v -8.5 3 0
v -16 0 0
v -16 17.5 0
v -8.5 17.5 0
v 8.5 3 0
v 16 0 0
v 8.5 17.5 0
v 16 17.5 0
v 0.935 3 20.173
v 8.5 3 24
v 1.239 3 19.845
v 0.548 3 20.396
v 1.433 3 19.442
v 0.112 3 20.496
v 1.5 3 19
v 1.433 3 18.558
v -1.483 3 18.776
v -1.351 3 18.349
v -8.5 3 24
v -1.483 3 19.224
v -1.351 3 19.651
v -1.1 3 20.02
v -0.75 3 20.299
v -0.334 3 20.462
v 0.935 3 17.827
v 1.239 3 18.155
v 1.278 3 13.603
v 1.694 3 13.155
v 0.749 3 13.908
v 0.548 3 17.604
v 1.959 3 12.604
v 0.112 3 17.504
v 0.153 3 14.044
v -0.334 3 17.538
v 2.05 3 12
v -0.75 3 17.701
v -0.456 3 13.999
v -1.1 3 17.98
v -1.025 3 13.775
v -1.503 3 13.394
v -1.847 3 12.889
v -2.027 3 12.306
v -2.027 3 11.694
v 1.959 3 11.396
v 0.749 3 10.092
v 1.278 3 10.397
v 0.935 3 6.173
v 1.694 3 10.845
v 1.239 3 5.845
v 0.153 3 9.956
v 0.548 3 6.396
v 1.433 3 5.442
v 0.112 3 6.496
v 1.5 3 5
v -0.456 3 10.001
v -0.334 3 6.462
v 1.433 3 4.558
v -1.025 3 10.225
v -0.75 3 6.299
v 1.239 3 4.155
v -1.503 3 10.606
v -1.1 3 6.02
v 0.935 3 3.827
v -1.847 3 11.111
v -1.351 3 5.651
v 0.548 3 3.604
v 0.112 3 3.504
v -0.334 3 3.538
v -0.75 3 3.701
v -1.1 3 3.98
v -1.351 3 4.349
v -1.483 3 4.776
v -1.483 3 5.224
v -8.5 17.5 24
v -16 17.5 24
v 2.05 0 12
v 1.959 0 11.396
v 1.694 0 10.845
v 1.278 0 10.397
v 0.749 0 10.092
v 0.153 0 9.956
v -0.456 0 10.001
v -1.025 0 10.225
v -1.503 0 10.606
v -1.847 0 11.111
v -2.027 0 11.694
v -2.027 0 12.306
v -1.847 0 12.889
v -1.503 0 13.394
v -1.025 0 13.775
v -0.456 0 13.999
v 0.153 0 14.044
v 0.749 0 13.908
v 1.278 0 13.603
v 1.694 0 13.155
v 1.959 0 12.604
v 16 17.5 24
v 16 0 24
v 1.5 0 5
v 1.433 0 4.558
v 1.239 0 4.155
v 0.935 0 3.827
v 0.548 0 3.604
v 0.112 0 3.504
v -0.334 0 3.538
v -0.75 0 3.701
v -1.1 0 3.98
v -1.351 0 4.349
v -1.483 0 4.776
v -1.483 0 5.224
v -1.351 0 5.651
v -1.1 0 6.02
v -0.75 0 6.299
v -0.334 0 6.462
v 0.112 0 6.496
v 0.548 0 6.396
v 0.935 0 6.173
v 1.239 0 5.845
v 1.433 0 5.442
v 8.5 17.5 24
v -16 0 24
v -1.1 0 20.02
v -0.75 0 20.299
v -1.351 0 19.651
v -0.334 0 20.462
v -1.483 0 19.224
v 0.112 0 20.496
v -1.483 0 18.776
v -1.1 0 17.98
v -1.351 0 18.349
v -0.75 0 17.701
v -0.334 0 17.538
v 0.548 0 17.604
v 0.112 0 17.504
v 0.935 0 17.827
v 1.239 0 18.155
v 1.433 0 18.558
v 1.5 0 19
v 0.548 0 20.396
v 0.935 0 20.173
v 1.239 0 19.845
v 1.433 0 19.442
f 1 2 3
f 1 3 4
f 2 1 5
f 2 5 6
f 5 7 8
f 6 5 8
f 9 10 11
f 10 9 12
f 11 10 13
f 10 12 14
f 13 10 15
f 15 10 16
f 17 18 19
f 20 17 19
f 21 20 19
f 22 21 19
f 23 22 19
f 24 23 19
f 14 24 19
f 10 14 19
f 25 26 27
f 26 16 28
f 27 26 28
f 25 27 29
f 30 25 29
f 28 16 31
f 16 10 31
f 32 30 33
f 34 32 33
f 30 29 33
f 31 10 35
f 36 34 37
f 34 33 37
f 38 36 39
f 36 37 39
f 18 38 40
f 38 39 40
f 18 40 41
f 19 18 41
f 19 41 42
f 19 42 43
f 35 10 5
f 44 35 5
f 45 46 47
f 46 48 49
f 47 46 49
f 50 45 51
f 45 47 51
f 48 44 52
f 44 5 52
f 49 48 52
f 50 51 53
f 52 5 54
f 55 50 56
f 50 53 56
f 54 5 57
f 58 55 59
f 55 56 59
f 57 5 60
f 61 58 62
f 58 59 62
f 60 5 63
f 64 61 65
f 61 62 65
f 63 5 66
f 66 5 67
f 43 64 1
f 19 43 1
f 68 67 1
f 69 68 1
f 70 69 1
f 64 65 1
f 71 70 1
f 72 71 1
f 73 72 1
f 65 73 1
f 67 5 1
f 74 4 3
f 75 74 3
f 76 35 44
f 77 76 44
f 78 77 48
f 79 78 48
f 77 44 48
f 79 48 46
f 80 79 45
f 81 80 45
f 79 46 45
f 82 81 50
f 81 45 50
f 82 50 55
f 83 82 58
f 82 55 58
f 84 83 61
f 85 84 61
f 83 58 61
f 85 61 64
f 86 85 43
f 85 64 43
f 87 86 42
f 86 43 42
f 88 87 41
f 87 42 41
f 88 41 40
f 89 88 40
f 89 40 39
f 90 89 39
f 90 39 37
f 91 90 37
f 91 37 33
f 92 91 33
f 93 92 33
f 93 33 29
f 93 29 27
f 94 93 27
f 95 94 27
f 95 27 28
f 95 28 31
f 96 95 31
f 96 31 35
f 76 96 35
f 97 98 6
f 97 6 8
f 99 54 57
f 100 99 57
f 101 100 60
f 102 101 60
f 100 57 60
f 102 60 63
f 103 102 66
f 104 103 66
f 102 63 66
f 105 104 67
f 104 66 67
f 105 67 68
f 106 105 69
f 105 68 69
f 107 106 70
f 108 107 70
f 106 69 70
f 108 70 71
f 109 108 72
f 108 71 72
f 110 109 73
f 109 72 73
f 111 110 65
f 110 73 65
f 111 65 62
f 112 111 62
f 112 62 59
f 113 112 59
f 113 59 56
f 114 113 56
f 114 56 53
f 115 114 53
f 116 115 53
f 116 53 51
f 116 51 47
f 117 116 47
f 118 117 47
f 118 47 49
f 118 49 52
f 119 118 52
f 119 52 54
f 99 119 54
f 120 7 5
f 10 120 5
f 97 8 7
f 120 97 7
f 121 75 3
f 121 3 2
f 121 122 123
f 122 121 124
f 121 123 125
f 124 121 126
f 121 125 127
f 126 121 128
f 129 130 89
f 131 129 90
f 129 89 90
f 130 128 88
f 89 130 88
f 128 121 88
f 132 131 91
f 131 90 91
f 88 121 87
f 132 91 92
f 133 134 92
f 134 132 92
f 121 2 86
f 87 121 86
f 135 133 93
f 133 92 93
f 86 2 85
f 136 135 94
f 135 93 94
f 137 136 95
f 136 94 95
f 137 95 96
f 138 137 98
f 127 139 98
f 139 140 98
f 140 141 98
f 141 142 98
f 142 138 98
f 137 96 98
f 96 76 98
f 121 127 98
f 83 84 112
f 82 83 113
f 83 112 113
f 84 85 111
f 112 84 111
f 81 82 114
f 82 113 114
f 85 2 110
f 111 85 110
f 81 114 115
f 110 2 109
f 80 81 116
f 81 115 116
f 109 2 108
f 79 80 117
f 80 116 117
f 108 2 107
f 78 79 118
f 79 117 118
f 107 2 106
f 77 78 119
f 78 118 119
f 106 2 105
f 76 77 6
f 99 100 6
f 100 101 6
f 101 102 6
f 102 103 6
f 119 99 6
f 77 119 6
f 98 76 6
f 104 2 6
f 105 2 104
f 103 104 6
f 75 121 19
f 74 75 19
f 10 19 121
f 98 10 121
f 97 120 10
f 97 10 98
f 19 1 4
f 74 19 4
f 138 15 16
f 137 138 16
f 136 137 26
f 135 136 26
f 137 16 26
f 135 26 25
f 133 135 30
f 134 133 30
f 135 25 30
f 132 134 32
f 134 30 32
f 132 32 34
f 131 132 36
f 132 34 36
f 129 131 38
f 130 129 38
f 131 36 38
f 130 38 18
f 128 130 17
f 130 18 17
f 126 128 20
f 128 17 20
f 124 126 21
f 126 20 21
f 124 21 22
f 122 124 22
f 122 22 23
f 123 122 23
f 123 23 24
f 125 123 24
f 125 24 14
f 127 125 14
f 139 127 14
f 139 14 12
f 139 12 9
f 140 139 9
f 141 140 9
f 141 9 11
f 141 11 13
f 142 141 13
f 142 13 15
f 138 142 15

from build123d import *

# Parameters (mm, degrees)
BOSS_EXTRUDE1_DEPTH = 24
CUT_EXTRUDE1_REACH  = 5
SKETCH4_R           = 1.5
SKETCH4_R_2         = 2.05


with BuildPart() as part:
    # Sketch3 → Boss-Extrude1 (new body)
    with BuildSketch(Plane.XY):
        Polygon((-16, 0), (16, 0), (16, 17.5), (8.5, 17.5), (8.5, 3), (-8.5, 3), (-8.5, 17.5), (-16, 17.5), align=None)
    extrude(amount=BOSS_EXTRUDE1_DEPTH)

    # Sketch4 → Cut-Extrude1 (cut, up to next)
    with BuildSketch(Plane(origin=(0, 3, 0), x_dir=(1, 0, 0), z_dir=(0, 1, 0)), mode=Mode.PRIVATE) as cut_extrude1_sk1:
        with Locations((0, -5)):
            Circle(SKETCH4_R)
    cut_extrude1_tool1 = extrude(cut_extrude1_sk1.sketch, amount=-CUT_EXTRUDE1_REACH, mode=Mode.PRIVATE) & part.part
    add(cut_extrude1_tool1.solids().sort_by_distance((0, 3, 5))[0], mode=Mode.SUBTRACT)
    # Sketch4 → Cut-Extrude1 (cut, up to next)
    with BuildSketch(Plane(origin=(0, 3, 0), x_dir=(1, 0, 0), z_dir=(0, 1, 0)), mode=Mode.PRIVATE) as cut_extrude1_sk2:
        with Locations((0, -12)):
            Circle(SKETCH4_R_2)
    cut_extrude1_tool2 = extrude(cut_extrude1_sk2.sketch, amount=-CUT_EXTRUDE1_REACH, mode=Mode.PRIVATE) & part.part
    add(cut_extrude1_tool2.solids().sort_by_distance((0, 3, 12))[0], mode=Mode.SUBTRACT)
    # Sketch4 → Cut-Extrude1 (cut, up to next)
    with BuildSketch(Plane(origin=(0, 3, 0), x_dir=(1, 0, 0), z_dir=(0, 1, 0)), mode=Mode.PRIVATE) as cut_extrude1_sk3:
        with Locations((0, -19)):
            Circle(SKETCH4_R)
    cut_extrude1_tool3 = extrude(cut_extrude1_sk3.sketch, amount=-CUT_EXTRUDE1_REACH, mode=Mode.PRIVATE) & part.part
    add(cut_extrude1_tool3.solids().sort_by_distance((0, 3, 19))[0], mode=Mode.SUBTRACT)


solid = part.part
